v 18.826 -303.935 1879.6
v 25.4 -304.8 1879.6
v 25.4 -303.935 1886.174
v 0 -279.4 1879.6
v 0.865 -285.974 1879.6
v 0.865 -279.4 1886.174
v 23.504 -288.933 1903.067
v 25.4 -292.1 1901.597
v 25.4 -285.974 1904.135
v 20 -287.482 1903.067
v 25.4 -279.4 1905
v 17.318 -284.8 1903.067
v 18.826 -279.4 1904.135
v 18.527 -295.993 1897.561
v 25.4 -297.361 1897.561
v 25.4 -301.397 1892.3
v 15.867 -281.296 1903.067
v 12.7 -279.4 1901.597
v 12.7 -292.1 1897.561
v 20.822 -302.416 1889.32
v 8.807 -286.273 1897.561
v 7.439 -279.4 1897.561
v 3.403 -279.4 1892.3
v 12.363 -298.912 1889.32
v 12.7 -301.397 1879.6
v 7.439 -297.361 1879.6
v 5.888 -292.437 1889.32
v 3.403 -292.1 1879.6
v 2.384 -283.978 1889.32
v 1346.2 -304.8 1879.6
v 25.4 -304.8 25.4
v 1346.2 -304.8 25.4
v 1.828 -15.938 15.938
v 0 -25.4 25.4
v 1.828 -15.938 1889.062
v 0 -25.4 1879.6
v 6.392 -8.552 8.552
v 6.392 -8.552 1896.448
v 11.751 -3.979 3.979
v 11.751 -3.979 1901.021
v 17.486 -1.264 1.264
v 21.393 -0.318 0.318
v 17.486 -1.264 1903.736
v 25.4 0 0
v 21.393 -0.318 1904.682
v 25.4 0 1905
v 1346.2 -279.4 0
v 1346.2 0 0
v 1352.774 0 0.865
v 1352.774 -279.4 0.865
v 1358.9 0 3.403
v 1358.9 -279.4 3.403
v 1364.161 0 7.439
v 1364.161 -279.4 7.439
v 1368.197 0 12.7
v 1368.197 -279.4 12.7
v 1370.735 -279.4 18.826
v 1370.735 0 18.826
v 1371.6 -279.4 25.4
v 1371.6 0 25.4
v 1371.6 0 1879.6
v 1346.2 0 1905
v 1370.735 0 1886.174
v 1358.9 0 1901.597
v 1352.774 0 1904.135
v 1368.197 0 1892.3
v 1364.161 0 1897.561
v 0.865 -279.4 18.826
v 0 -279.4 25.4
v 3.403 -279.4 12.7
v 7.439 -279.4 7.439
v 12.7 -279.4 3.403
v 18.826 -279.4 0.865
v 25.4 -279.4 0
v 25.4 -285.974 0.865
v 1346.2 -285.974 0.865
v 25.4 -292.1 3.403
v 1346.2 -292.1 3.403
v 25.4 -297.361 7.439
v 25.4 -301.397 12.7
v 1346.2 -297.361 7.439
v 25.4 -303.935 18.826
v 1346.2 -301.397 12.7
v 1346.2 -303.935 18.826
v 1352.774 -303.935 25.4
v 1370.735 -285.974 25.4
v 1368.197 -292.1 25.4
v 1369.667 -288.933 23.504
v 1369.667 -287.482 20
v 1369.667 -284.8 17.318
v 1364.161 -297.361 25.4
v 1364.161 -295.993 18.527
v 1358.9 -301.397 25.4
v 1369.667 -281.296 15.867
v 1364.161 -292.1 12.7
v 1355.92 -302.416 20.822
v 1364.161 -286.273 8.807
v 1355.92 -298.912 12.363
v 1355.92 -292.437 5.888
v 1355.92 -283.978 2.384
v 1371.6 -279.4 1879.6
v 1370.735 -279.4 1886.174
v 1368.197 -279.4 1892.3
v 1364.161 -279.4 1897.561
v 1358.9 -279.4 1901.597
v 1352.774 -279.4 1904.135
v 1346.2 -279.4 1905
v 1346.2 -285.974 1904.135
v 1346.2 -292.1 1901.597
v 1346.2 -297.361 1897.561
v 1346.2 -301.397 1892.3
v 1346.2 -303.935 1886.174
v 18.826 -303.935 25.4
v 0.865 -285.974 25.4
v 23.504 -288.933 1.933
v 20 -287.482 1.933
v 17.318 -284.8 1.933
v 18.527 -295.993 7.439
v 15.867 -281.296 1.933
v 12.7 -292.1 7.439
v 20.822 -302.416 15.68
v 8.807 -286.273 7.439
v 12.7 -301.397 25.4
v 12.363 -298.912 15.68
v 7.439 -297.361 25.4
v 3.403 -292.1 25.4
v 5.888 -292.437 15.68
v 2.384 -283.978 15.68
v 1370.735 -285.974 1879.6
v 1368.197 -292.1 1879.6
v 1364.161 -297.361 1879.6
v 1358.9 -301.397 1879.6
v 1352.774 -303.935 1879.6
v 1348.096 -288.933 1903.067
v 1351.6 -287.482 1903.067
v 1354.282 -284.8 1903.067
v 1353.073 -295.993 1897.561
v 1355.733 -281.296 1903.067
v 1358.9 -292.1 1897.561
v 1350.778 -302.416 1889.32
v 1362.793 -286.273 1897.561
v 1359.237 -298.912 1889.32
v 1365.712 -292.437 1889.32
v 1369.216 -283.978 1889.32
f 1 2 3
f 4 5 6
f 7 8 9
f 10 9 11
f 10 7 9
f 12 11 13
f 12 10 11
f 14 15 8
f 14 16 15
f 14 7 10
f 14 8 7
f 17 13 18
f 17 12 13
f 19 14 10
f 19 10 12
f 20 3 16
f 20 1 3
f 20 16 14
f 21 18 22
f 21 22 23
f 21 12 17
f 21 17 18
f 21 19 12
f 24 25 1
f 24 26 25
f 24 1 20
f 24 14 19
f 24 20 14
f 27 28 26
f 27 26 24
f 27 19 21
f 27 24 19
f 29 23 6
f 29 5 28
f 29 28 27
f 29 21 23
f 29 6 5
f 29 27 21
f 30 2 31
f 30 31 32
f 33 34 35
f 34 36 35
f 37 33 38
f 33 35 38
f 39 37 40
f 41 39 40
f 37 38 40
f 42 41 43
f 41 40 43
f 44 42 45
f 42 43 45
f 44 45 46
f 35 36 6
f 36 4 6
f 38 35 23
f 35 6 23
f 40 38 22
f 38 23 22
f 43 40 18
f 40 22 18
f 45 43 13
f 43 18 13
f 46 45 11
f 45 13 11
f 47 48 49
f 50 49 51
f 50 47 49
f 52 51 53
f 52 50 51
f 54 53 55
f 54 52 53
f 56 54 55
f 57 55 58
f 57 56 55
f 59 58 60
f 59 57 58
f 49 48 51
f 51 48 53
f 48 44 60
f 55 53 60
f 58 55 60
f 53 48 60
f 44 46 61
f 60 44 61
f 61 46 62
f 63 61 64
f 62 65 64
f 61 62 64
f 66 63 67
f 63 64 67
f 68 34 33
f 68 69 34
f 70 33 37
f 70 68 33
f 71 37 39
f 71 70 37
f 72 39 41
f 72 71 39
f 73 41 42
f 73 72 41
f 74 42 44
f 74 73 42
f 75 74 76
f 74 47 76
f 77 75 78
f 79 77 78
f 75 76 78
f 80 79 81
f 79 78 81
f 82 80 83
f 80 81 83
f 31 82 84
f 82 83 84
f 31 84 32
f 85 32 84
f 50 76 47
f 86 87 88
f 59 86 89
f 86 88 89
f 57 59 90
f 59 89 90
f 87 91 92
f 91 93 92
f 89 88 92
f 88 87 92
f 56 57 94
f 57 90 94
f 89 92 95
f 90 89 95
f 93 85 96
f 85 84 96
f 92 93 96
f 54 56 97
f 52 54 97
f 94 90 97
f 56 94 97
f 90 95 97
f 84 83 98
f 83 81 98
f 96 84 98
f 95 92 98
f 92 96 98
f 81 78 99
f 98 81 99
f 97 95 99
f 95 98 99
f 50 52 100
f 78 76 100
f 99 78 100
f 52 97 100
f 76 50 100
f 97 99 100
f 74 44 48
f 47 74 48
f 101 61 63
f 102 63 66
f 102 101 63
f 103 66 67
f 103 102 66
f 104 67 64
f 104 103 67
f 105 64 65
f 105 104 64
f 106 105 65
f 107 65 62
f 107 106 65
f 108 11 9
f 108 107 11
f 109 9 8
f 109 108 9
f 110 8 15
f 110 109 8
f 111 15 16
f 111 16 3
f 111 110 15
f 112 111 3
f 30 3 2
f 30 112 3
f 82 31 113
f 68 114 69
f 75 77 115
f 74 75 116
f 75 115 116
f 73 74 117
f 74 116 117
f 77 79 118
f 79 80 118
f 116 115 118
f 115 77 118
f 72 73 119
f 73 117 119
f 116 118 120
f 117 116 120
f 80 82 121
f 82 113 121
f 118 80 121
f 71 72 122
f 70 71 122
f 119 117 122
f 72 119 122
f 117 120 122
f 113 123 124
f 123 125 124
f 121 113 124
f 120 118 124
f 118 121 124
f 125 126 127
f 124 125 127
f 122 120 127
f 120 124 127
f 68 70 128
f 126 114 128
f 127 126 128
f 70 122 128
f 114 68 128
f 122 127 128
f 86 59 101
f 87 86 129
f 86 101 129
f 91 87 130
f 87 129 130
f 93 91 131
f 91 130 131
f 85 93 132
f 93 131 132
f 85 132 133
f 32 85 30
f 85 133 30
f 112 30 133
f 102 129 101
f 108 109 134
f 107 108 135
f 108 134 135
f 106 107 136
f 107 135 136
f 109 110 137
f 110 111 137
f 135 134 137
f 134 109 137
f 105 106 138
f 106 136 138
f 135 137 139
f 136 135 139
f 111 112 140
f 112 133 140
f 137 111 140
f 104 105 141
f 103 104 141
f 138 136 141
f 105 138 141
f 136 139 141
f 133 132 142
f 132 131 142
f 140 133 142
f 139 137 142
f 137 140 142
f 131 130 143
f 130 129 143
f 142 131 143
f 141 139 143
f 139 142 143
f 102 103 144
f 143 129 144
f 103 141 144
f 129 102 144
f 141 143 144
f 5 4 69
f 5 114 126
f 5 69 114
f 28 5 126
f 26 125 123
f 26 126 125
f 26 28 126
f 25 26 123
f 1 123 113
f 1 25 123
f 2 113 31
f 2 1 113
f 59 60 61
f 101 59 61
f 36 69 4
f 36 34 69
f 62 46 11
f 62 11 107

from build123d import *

# Parameters (mm, degrees)
F0_W     = 1371.6
F0_H     = 1905
F1_DEPTH = 304.8
F2_R     = 25.4


with BuildPart() as f1:
    # F0 (on Front) → F1 (new body)
    with BuildSketch(Plane.XZ):
        with Locations((685.8, 952.5)):
            Rectangle(F0_W, F0_H)
    extrude(amount=F1_DEPTH)

    # F2
    f2_edges = [f1.edges().sort_by_distance(p)[0] for p in [
        (0, -304.8, 952.5),
        (685.8, -304.8, 0),
        (1371.6, -304.8, 952.5),
        (685.8, -304.8, 1905),
        (1371.6, -152.4, 0),
        (0, -152.4, 0),
        (0, -152.4, 1905),
        (0, 0, 952.5),
        (1371.6, -152.4, 1905),
    ]]
    fillet(f2_edges, radius=F2_R)


solid = f1.part
